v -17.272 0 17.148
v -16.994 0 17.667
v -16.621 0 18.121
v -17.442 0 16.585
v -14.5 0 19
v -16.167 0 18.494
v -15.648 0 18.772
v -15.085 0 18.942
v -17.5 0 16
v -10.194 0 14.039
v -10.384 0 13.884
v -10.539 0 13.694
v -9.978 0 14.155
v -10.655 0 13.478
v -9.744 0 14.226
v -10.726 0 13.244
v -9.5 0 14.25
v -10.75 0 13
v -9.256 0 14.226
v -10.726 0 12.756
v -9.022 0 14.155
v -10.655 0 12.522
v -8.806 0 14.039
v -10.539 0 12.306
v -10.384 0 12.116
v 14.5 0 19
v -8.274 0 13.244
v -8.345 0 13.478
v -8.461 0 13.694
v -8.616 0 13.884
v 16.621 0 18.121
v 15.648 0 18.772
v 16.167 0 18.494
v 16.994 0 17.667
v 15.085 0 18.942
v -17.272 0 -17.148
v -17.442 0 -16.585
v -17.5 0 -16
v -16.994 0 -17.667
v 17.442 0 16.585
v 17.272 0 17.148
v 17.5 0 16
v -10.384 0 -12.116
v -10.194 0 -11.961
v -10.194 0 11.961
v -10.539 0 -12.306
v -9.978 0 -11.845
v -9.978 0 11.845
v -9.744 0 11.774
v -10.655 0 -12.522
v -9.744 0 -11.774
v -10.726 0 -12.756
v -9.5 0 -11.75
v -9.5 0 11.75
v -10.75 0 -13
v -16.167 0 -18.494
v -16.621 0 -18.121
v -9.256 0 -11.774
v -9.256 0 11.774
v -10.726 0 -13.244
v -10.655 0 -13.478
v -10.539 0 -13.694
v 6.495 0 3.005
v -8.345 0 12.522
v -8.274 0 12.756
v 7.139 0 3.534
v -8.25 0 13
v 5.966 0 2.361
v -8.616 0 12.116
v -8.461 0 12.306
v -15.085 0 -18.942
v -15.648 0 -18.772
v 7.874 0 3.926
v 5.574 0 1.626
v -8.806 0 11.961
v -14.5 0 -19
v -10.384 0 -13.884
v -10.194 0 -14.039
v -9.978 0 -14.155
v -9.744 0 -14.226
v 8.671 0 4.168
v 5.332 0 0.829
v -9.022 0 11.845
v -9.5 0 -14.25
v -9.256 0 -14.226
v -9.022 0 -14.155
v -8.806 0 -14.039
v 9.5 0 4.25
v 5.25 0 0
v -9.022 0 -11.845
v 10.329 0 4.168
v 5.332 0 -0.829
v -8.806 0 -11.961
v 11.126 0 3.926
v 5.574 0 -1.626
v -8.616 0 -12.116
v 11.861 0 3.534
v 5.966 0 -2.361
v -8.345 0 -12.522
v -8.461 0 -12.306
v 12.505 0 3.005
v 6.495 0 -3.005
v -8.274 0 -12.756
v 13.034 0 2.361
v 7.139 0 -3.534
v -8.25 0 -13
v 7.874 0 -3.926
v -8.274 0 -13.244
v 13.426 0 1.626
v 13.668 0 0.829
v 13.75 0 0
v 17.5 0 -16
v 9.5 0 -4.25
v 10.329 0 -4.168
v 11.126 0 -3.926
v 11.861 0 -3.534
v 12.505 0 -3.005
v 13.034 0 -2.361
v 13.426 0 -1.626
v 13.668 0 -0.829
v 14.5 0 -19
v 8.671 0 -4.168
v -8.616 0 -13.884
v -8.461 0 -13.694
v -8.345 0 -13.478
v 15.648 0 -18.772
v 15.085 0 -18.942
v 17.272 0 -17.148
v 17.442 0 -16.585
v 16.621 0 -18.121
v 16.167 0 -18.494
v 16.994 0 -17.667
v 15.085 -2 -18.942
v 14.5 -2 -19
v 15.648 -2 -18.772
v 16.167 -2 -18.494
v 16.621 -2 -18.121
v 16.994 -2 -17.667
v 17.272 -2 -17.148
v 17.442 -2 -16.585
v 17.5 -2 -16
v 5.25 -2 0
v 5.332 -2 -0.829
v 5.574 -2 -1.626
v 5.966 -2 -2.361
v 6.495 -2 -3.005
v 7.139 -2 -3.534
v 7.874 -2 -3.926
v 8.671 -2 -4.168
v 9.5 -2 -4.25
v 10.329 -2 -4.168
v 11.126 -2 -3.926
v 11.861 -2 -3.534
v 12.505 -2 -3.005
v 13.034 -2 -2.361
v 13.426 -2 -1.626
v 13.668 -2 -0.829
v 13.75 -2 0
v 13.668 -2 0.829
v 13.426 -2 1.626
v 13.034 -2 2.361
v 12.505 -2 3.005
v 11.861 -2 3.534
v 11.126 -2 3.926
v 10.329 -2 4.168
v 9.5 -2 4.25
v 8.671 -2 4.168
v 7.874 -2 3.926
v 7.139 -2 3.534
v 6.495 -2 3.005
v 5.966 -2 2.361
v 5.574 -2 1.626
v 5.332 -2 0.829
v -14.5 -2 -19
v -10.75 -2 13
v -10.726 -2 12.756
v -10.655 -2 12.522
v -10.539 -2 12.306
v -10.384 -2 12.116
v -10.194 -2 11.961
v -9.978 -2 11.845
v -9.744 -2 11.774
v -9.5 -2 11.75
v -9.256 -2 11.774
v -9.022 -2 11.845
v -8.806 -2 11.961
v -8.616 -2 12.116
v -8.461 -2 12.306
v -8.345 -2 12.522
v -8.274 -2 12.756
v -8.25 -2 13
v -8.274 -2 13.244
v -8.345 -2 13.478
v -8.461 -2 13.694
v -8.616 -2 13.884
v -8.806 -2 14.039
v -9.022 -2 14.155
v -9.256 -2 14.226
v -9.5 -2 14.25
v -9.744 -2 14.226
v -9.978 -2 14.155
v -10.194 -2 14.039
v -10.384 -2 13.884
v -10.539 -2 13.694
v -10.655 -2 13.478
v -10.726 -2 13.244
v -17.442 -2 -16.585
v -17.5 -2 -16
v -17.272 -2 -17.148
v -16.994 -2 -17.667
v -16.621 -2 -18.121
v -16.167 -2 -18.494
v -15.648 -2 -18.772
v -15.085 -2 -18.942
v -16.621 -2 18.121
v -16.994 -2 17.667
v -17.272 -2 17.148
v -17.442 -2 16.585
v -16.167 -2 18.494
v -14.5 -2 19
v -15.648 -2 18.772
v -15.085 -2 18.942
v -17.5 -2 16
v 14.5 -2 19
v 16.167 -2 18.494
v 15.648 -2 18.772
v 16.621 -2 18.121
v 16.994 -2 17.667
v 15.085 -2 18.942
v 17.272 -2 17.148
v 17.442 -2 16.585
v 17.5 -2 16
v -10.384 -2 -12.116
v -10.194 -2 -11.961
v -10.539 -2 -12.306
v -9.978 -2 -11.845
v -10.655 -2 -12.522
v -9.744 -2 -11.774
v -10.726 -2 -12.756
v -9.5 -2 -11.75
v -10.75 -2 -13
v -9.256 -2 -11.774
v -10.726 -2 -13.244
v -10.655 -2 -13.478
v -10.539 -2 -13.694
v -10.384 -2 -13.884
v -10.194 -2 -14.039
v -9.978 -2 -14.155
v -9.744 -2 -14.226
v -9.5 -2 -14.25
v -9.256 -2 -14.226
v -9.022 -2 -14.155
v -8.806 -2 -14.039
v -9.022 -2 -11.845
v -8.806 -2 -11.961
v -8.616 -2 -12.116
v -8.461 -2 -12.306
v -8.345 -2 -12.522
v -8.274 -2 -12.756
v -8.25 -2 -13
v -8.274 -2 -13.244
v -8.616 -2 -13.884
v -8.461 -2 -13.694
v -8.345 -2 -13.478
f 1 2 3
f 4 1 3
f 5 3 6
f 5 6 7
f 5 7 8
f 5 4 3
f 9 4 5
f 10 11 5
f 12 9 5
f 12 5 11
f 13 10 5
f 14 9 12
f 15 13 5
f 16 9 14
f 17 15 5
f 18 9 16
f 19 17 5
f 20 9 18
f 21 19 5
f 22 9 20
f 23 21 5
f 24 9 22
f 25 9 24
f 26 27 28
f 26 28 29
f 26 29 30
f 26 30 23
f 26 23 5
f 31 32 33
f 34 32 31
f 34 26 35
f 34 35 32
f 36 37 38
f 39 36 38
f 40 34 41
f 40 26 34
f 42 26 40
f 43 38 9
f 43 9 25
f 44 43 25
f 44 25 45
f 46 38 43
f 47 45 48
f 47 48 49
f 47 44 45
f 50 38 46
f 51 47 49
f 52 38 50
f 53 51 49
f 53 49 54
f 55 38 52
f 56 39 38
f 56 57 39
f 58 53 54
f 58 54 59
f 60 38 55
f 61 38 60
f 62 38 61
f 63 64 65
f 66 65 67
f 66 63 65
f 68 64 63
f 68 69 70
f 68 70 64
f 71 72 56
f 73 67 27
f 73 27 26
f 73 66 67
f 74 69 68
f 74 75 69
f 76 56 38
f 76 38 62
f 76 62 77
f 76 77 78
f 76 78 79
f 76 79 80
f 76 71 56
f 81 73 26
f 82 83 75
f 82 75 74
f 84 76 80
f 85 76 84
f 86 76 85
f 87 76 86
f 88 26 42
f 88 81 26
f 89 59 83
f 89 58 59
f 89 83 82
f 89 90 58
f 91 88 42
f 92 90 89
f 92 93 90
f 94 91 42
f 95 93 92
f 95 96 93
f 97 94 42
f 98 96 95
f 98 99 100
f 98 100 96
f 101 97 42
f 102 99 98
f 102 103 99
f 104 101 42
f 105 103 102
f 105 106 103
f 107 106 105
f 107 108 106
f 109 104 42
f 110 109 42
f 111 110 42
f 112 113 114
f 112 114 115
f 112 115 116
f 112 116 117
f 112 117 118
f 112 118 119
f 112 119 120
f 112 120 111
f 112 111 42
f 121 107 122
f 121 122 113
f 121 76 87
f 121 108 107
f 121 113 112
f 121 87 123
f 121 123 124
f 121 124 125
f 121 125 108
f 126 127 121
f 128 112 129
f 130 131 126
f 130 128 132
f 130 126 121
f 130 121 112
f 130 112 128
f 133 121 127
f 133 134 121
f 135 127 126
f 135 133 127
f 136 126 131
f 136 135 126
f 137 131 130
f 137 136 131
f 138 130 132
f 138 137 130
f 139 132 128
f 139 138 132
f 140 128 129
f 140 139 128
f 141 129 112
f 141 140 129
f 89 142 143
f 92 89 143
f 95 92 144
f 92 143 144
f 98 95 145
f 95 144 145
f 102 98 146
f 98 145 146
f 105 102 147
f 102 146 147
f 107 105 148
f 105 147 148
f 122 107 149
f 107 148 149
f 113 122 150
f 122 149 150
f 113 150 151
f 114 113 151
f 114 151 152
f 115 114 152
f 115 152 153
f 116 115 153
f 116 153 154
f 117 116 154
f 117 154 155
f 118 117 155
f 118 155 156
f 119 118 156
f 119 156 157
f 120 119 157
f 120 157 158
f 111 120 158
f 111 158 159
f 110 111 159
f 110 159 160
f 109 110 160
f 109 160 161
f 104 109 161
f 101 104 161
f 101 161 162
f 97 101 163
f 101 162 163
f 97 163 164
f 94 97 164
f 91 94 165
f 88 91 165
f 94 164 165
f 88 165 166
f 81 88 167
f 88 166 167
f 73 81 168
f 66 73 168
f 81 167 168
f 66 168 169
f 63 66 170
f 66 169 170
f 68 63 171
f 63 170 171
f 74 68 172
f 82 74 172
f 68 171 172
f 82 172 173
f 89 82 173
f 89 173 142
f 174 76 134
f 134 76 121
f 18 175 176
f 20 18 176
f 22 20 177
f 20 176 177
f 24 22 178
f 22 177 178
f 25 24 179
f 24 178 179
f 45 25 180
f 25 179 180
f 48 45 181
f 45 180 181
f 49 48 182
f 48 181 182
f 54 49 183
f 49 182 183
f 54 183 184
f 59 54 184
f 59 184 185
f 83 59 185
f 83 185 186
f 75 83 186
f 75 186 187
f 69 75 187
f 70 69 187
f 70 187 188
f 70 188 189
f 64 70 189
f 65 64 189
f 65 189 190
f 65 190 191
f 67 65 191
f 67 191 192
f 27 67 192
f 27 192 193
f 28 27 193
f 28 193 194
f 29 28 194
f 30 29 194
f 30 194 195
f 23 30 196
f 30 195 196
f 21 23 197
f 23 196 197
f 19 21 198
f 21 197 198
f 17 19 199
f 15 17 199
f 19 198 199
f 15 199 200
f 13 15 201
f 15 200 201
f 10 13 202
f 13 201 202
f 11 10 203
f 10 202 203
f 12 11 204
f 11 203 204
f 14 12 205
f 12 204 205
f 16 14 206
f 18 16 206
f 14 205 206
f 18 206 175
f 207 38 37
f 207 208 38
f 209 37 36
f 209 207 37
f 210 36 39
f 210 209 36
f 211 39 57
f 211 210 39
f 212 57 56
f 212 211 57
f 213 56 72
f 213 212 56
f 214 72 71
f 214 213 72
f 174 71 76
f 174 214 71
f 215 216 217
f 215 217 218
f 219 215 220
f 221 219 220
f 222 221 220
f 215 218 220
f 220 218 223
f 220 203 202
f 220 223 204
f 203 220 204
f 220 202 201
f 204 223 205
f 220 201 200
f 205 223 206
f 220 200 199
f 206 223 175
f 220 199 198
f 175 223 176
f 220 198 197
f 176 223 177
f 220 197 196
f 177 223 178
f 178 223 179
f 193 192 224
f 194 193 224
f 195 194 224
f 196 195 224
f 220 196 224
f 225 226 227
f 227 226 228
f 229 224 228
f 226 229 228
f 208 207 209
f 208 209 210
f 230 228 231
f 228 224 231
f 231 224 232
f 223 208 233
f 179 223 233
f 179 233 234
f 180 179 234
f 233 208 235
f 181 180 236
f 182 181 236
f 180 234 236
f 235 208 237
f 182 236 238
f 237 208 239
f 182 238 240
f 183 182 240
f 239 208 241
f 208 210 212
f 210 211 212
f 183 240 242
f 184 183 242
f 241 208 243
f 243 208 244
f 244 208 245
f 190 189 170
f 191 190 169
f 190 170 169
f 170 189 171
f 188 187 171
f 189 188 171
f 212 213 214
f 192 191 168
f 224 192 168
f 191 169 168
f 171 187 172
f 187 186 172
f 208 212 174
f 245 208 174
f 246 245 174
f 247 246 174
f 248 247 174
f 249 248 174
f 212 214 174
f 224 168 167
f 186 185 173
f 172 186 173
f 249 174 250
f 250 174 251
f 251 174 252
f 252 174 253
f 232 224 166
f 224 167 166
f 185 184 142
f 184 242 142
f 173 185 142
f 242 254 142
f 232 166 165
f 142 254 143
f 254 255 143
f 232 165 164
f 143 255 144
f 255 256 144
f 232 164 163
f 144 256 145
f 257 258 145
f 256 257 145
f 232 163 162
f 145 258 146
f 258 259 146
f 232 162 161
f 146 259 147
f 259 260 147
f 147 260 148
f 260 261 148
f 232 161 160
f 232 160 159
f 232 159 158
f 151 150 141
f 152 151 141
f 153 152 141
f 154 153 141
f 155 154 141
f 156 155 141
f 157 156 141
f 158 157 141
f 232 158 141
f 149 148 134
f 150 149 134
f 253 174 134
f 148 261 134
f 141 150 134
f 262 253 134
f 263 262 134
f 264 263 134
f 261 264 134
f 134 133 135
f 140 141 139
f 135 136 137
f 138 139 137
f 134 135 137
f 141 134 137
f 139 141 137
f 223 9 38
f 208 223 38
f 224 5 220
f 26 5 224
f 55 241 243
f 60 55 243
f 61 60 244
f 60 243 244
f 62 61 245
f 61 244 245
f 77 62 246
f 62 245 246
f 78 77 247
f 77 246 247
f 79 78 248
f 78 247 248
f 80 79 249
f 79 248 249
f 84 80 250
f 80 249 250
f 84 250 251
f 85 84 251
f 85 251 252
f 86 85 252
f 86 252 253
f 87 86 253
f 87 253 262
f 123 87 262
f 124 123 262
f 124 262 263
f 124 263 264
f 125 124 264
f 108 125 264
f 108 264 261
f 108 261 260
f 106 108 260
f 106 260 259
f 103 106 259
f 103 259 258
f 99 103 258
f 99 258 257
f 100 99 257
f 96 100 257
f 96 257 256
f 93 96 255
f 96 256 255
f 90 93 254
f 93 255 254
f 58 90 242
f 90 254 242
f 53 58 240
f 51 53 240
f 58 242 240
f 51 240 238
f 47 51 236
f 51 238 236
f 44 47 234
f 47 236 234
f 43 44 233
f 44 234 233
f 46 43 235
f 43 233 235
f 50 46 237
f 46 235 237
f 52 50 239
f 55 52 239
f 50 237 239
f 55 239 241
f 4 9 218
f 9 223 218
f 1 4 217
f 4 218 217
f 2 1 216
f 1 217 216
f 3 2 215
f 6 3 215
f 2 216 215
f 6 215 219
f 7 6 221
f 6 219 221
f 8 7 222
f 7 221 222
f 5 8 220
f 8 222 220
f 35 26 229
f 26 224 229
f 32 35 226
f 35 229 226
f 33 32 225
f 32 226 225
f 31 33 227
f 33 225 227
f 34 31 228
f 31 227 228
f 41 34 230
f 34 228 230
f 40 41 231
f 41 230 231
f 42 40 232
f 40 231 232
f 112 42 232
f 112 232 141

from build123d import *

# Parameters (mm, degrees)
SKETCH1_W                        = 35
SKETCH1_H                        = 38
BASE_FLANGE1_DEPTH               = 2
TAP_DRILL_FOR_M3X0_5_TAP1_D      = 2.5
FILLET1_R                        = 3
TAP_DRILL_FOR_M10X1_5_TAP1_D     = 8.5
TAP_DRILL_FOR_M10X1_5_TAP1_DEPTH = 5
TAP_DRILL_FOR_M10X1_5_TAP1_TIP   = 2.553657631


# Sheet-metal steps are written as plain solids
with BuildPart() as part:
    # Sketch1 → Base-Flange1 (new body)
    with BuildSketch(Plane(origin=(0, 0, 0), x_dir=(1, 0, 0), z_dir=(0, 1, 0))):
        Rectangle(SKETCH1_W, SKETCH1_H)
    extrude(amount=-BASE_FLANGE1_DEPTH)

    # Tap Drill for M3x0.5 Tap1 (through all)
    with Locations(Plane(origin=(0, 0, 0), x_dir=(1, 0, 0), z_dir=(0, 1, 0))):
        with Locations((-9.5, -13), (-9.5, 13)):
            Hole(TAP_DRILL_FOR_M3X0_5_TAP1_D / 2)

    # Fillet1
    fillet1_edges = [part.edges().sort_by_distance(p)[0] for p in [
        (-17.5, -1, -19),
        (17.5, -1, -19),
        (17.5, -1, 19),
        (-17.5, -1, 19),
    ]]
    fillet(fillet1_edges, radius=FILLET1_R)

    # Tap Drill for M10x1.5 Tap1
    with Locations(Plane(origin=(0, 0, 0), x_dir=(1, 0, 0), z_dir=(0, 1, 0))):
        with Locations((9.5, 0)):
            Hole(TAP_DRILL_FOR_M10X1_5_TAP1_D / 2, depth=TAP_DRILL_FOR_M10X1_5_TAP1_DEPTH)
            with Locations((0, 0, -(TAP_DRILL_FOR_M10X1_5_TAP1_DEPTH + TAP_DRILL_FOR_M10X1_5_TAP1_TIP / 2))):  # 118° drill point
                Cone(0, TAP_DRILL_FOR_M10X1_5_TAP1_D / 2, TAP_DRILL_FOR_M10X1_5_TAP1_TIP, mode=Mode.SUBTRACT)


solid = part.part
